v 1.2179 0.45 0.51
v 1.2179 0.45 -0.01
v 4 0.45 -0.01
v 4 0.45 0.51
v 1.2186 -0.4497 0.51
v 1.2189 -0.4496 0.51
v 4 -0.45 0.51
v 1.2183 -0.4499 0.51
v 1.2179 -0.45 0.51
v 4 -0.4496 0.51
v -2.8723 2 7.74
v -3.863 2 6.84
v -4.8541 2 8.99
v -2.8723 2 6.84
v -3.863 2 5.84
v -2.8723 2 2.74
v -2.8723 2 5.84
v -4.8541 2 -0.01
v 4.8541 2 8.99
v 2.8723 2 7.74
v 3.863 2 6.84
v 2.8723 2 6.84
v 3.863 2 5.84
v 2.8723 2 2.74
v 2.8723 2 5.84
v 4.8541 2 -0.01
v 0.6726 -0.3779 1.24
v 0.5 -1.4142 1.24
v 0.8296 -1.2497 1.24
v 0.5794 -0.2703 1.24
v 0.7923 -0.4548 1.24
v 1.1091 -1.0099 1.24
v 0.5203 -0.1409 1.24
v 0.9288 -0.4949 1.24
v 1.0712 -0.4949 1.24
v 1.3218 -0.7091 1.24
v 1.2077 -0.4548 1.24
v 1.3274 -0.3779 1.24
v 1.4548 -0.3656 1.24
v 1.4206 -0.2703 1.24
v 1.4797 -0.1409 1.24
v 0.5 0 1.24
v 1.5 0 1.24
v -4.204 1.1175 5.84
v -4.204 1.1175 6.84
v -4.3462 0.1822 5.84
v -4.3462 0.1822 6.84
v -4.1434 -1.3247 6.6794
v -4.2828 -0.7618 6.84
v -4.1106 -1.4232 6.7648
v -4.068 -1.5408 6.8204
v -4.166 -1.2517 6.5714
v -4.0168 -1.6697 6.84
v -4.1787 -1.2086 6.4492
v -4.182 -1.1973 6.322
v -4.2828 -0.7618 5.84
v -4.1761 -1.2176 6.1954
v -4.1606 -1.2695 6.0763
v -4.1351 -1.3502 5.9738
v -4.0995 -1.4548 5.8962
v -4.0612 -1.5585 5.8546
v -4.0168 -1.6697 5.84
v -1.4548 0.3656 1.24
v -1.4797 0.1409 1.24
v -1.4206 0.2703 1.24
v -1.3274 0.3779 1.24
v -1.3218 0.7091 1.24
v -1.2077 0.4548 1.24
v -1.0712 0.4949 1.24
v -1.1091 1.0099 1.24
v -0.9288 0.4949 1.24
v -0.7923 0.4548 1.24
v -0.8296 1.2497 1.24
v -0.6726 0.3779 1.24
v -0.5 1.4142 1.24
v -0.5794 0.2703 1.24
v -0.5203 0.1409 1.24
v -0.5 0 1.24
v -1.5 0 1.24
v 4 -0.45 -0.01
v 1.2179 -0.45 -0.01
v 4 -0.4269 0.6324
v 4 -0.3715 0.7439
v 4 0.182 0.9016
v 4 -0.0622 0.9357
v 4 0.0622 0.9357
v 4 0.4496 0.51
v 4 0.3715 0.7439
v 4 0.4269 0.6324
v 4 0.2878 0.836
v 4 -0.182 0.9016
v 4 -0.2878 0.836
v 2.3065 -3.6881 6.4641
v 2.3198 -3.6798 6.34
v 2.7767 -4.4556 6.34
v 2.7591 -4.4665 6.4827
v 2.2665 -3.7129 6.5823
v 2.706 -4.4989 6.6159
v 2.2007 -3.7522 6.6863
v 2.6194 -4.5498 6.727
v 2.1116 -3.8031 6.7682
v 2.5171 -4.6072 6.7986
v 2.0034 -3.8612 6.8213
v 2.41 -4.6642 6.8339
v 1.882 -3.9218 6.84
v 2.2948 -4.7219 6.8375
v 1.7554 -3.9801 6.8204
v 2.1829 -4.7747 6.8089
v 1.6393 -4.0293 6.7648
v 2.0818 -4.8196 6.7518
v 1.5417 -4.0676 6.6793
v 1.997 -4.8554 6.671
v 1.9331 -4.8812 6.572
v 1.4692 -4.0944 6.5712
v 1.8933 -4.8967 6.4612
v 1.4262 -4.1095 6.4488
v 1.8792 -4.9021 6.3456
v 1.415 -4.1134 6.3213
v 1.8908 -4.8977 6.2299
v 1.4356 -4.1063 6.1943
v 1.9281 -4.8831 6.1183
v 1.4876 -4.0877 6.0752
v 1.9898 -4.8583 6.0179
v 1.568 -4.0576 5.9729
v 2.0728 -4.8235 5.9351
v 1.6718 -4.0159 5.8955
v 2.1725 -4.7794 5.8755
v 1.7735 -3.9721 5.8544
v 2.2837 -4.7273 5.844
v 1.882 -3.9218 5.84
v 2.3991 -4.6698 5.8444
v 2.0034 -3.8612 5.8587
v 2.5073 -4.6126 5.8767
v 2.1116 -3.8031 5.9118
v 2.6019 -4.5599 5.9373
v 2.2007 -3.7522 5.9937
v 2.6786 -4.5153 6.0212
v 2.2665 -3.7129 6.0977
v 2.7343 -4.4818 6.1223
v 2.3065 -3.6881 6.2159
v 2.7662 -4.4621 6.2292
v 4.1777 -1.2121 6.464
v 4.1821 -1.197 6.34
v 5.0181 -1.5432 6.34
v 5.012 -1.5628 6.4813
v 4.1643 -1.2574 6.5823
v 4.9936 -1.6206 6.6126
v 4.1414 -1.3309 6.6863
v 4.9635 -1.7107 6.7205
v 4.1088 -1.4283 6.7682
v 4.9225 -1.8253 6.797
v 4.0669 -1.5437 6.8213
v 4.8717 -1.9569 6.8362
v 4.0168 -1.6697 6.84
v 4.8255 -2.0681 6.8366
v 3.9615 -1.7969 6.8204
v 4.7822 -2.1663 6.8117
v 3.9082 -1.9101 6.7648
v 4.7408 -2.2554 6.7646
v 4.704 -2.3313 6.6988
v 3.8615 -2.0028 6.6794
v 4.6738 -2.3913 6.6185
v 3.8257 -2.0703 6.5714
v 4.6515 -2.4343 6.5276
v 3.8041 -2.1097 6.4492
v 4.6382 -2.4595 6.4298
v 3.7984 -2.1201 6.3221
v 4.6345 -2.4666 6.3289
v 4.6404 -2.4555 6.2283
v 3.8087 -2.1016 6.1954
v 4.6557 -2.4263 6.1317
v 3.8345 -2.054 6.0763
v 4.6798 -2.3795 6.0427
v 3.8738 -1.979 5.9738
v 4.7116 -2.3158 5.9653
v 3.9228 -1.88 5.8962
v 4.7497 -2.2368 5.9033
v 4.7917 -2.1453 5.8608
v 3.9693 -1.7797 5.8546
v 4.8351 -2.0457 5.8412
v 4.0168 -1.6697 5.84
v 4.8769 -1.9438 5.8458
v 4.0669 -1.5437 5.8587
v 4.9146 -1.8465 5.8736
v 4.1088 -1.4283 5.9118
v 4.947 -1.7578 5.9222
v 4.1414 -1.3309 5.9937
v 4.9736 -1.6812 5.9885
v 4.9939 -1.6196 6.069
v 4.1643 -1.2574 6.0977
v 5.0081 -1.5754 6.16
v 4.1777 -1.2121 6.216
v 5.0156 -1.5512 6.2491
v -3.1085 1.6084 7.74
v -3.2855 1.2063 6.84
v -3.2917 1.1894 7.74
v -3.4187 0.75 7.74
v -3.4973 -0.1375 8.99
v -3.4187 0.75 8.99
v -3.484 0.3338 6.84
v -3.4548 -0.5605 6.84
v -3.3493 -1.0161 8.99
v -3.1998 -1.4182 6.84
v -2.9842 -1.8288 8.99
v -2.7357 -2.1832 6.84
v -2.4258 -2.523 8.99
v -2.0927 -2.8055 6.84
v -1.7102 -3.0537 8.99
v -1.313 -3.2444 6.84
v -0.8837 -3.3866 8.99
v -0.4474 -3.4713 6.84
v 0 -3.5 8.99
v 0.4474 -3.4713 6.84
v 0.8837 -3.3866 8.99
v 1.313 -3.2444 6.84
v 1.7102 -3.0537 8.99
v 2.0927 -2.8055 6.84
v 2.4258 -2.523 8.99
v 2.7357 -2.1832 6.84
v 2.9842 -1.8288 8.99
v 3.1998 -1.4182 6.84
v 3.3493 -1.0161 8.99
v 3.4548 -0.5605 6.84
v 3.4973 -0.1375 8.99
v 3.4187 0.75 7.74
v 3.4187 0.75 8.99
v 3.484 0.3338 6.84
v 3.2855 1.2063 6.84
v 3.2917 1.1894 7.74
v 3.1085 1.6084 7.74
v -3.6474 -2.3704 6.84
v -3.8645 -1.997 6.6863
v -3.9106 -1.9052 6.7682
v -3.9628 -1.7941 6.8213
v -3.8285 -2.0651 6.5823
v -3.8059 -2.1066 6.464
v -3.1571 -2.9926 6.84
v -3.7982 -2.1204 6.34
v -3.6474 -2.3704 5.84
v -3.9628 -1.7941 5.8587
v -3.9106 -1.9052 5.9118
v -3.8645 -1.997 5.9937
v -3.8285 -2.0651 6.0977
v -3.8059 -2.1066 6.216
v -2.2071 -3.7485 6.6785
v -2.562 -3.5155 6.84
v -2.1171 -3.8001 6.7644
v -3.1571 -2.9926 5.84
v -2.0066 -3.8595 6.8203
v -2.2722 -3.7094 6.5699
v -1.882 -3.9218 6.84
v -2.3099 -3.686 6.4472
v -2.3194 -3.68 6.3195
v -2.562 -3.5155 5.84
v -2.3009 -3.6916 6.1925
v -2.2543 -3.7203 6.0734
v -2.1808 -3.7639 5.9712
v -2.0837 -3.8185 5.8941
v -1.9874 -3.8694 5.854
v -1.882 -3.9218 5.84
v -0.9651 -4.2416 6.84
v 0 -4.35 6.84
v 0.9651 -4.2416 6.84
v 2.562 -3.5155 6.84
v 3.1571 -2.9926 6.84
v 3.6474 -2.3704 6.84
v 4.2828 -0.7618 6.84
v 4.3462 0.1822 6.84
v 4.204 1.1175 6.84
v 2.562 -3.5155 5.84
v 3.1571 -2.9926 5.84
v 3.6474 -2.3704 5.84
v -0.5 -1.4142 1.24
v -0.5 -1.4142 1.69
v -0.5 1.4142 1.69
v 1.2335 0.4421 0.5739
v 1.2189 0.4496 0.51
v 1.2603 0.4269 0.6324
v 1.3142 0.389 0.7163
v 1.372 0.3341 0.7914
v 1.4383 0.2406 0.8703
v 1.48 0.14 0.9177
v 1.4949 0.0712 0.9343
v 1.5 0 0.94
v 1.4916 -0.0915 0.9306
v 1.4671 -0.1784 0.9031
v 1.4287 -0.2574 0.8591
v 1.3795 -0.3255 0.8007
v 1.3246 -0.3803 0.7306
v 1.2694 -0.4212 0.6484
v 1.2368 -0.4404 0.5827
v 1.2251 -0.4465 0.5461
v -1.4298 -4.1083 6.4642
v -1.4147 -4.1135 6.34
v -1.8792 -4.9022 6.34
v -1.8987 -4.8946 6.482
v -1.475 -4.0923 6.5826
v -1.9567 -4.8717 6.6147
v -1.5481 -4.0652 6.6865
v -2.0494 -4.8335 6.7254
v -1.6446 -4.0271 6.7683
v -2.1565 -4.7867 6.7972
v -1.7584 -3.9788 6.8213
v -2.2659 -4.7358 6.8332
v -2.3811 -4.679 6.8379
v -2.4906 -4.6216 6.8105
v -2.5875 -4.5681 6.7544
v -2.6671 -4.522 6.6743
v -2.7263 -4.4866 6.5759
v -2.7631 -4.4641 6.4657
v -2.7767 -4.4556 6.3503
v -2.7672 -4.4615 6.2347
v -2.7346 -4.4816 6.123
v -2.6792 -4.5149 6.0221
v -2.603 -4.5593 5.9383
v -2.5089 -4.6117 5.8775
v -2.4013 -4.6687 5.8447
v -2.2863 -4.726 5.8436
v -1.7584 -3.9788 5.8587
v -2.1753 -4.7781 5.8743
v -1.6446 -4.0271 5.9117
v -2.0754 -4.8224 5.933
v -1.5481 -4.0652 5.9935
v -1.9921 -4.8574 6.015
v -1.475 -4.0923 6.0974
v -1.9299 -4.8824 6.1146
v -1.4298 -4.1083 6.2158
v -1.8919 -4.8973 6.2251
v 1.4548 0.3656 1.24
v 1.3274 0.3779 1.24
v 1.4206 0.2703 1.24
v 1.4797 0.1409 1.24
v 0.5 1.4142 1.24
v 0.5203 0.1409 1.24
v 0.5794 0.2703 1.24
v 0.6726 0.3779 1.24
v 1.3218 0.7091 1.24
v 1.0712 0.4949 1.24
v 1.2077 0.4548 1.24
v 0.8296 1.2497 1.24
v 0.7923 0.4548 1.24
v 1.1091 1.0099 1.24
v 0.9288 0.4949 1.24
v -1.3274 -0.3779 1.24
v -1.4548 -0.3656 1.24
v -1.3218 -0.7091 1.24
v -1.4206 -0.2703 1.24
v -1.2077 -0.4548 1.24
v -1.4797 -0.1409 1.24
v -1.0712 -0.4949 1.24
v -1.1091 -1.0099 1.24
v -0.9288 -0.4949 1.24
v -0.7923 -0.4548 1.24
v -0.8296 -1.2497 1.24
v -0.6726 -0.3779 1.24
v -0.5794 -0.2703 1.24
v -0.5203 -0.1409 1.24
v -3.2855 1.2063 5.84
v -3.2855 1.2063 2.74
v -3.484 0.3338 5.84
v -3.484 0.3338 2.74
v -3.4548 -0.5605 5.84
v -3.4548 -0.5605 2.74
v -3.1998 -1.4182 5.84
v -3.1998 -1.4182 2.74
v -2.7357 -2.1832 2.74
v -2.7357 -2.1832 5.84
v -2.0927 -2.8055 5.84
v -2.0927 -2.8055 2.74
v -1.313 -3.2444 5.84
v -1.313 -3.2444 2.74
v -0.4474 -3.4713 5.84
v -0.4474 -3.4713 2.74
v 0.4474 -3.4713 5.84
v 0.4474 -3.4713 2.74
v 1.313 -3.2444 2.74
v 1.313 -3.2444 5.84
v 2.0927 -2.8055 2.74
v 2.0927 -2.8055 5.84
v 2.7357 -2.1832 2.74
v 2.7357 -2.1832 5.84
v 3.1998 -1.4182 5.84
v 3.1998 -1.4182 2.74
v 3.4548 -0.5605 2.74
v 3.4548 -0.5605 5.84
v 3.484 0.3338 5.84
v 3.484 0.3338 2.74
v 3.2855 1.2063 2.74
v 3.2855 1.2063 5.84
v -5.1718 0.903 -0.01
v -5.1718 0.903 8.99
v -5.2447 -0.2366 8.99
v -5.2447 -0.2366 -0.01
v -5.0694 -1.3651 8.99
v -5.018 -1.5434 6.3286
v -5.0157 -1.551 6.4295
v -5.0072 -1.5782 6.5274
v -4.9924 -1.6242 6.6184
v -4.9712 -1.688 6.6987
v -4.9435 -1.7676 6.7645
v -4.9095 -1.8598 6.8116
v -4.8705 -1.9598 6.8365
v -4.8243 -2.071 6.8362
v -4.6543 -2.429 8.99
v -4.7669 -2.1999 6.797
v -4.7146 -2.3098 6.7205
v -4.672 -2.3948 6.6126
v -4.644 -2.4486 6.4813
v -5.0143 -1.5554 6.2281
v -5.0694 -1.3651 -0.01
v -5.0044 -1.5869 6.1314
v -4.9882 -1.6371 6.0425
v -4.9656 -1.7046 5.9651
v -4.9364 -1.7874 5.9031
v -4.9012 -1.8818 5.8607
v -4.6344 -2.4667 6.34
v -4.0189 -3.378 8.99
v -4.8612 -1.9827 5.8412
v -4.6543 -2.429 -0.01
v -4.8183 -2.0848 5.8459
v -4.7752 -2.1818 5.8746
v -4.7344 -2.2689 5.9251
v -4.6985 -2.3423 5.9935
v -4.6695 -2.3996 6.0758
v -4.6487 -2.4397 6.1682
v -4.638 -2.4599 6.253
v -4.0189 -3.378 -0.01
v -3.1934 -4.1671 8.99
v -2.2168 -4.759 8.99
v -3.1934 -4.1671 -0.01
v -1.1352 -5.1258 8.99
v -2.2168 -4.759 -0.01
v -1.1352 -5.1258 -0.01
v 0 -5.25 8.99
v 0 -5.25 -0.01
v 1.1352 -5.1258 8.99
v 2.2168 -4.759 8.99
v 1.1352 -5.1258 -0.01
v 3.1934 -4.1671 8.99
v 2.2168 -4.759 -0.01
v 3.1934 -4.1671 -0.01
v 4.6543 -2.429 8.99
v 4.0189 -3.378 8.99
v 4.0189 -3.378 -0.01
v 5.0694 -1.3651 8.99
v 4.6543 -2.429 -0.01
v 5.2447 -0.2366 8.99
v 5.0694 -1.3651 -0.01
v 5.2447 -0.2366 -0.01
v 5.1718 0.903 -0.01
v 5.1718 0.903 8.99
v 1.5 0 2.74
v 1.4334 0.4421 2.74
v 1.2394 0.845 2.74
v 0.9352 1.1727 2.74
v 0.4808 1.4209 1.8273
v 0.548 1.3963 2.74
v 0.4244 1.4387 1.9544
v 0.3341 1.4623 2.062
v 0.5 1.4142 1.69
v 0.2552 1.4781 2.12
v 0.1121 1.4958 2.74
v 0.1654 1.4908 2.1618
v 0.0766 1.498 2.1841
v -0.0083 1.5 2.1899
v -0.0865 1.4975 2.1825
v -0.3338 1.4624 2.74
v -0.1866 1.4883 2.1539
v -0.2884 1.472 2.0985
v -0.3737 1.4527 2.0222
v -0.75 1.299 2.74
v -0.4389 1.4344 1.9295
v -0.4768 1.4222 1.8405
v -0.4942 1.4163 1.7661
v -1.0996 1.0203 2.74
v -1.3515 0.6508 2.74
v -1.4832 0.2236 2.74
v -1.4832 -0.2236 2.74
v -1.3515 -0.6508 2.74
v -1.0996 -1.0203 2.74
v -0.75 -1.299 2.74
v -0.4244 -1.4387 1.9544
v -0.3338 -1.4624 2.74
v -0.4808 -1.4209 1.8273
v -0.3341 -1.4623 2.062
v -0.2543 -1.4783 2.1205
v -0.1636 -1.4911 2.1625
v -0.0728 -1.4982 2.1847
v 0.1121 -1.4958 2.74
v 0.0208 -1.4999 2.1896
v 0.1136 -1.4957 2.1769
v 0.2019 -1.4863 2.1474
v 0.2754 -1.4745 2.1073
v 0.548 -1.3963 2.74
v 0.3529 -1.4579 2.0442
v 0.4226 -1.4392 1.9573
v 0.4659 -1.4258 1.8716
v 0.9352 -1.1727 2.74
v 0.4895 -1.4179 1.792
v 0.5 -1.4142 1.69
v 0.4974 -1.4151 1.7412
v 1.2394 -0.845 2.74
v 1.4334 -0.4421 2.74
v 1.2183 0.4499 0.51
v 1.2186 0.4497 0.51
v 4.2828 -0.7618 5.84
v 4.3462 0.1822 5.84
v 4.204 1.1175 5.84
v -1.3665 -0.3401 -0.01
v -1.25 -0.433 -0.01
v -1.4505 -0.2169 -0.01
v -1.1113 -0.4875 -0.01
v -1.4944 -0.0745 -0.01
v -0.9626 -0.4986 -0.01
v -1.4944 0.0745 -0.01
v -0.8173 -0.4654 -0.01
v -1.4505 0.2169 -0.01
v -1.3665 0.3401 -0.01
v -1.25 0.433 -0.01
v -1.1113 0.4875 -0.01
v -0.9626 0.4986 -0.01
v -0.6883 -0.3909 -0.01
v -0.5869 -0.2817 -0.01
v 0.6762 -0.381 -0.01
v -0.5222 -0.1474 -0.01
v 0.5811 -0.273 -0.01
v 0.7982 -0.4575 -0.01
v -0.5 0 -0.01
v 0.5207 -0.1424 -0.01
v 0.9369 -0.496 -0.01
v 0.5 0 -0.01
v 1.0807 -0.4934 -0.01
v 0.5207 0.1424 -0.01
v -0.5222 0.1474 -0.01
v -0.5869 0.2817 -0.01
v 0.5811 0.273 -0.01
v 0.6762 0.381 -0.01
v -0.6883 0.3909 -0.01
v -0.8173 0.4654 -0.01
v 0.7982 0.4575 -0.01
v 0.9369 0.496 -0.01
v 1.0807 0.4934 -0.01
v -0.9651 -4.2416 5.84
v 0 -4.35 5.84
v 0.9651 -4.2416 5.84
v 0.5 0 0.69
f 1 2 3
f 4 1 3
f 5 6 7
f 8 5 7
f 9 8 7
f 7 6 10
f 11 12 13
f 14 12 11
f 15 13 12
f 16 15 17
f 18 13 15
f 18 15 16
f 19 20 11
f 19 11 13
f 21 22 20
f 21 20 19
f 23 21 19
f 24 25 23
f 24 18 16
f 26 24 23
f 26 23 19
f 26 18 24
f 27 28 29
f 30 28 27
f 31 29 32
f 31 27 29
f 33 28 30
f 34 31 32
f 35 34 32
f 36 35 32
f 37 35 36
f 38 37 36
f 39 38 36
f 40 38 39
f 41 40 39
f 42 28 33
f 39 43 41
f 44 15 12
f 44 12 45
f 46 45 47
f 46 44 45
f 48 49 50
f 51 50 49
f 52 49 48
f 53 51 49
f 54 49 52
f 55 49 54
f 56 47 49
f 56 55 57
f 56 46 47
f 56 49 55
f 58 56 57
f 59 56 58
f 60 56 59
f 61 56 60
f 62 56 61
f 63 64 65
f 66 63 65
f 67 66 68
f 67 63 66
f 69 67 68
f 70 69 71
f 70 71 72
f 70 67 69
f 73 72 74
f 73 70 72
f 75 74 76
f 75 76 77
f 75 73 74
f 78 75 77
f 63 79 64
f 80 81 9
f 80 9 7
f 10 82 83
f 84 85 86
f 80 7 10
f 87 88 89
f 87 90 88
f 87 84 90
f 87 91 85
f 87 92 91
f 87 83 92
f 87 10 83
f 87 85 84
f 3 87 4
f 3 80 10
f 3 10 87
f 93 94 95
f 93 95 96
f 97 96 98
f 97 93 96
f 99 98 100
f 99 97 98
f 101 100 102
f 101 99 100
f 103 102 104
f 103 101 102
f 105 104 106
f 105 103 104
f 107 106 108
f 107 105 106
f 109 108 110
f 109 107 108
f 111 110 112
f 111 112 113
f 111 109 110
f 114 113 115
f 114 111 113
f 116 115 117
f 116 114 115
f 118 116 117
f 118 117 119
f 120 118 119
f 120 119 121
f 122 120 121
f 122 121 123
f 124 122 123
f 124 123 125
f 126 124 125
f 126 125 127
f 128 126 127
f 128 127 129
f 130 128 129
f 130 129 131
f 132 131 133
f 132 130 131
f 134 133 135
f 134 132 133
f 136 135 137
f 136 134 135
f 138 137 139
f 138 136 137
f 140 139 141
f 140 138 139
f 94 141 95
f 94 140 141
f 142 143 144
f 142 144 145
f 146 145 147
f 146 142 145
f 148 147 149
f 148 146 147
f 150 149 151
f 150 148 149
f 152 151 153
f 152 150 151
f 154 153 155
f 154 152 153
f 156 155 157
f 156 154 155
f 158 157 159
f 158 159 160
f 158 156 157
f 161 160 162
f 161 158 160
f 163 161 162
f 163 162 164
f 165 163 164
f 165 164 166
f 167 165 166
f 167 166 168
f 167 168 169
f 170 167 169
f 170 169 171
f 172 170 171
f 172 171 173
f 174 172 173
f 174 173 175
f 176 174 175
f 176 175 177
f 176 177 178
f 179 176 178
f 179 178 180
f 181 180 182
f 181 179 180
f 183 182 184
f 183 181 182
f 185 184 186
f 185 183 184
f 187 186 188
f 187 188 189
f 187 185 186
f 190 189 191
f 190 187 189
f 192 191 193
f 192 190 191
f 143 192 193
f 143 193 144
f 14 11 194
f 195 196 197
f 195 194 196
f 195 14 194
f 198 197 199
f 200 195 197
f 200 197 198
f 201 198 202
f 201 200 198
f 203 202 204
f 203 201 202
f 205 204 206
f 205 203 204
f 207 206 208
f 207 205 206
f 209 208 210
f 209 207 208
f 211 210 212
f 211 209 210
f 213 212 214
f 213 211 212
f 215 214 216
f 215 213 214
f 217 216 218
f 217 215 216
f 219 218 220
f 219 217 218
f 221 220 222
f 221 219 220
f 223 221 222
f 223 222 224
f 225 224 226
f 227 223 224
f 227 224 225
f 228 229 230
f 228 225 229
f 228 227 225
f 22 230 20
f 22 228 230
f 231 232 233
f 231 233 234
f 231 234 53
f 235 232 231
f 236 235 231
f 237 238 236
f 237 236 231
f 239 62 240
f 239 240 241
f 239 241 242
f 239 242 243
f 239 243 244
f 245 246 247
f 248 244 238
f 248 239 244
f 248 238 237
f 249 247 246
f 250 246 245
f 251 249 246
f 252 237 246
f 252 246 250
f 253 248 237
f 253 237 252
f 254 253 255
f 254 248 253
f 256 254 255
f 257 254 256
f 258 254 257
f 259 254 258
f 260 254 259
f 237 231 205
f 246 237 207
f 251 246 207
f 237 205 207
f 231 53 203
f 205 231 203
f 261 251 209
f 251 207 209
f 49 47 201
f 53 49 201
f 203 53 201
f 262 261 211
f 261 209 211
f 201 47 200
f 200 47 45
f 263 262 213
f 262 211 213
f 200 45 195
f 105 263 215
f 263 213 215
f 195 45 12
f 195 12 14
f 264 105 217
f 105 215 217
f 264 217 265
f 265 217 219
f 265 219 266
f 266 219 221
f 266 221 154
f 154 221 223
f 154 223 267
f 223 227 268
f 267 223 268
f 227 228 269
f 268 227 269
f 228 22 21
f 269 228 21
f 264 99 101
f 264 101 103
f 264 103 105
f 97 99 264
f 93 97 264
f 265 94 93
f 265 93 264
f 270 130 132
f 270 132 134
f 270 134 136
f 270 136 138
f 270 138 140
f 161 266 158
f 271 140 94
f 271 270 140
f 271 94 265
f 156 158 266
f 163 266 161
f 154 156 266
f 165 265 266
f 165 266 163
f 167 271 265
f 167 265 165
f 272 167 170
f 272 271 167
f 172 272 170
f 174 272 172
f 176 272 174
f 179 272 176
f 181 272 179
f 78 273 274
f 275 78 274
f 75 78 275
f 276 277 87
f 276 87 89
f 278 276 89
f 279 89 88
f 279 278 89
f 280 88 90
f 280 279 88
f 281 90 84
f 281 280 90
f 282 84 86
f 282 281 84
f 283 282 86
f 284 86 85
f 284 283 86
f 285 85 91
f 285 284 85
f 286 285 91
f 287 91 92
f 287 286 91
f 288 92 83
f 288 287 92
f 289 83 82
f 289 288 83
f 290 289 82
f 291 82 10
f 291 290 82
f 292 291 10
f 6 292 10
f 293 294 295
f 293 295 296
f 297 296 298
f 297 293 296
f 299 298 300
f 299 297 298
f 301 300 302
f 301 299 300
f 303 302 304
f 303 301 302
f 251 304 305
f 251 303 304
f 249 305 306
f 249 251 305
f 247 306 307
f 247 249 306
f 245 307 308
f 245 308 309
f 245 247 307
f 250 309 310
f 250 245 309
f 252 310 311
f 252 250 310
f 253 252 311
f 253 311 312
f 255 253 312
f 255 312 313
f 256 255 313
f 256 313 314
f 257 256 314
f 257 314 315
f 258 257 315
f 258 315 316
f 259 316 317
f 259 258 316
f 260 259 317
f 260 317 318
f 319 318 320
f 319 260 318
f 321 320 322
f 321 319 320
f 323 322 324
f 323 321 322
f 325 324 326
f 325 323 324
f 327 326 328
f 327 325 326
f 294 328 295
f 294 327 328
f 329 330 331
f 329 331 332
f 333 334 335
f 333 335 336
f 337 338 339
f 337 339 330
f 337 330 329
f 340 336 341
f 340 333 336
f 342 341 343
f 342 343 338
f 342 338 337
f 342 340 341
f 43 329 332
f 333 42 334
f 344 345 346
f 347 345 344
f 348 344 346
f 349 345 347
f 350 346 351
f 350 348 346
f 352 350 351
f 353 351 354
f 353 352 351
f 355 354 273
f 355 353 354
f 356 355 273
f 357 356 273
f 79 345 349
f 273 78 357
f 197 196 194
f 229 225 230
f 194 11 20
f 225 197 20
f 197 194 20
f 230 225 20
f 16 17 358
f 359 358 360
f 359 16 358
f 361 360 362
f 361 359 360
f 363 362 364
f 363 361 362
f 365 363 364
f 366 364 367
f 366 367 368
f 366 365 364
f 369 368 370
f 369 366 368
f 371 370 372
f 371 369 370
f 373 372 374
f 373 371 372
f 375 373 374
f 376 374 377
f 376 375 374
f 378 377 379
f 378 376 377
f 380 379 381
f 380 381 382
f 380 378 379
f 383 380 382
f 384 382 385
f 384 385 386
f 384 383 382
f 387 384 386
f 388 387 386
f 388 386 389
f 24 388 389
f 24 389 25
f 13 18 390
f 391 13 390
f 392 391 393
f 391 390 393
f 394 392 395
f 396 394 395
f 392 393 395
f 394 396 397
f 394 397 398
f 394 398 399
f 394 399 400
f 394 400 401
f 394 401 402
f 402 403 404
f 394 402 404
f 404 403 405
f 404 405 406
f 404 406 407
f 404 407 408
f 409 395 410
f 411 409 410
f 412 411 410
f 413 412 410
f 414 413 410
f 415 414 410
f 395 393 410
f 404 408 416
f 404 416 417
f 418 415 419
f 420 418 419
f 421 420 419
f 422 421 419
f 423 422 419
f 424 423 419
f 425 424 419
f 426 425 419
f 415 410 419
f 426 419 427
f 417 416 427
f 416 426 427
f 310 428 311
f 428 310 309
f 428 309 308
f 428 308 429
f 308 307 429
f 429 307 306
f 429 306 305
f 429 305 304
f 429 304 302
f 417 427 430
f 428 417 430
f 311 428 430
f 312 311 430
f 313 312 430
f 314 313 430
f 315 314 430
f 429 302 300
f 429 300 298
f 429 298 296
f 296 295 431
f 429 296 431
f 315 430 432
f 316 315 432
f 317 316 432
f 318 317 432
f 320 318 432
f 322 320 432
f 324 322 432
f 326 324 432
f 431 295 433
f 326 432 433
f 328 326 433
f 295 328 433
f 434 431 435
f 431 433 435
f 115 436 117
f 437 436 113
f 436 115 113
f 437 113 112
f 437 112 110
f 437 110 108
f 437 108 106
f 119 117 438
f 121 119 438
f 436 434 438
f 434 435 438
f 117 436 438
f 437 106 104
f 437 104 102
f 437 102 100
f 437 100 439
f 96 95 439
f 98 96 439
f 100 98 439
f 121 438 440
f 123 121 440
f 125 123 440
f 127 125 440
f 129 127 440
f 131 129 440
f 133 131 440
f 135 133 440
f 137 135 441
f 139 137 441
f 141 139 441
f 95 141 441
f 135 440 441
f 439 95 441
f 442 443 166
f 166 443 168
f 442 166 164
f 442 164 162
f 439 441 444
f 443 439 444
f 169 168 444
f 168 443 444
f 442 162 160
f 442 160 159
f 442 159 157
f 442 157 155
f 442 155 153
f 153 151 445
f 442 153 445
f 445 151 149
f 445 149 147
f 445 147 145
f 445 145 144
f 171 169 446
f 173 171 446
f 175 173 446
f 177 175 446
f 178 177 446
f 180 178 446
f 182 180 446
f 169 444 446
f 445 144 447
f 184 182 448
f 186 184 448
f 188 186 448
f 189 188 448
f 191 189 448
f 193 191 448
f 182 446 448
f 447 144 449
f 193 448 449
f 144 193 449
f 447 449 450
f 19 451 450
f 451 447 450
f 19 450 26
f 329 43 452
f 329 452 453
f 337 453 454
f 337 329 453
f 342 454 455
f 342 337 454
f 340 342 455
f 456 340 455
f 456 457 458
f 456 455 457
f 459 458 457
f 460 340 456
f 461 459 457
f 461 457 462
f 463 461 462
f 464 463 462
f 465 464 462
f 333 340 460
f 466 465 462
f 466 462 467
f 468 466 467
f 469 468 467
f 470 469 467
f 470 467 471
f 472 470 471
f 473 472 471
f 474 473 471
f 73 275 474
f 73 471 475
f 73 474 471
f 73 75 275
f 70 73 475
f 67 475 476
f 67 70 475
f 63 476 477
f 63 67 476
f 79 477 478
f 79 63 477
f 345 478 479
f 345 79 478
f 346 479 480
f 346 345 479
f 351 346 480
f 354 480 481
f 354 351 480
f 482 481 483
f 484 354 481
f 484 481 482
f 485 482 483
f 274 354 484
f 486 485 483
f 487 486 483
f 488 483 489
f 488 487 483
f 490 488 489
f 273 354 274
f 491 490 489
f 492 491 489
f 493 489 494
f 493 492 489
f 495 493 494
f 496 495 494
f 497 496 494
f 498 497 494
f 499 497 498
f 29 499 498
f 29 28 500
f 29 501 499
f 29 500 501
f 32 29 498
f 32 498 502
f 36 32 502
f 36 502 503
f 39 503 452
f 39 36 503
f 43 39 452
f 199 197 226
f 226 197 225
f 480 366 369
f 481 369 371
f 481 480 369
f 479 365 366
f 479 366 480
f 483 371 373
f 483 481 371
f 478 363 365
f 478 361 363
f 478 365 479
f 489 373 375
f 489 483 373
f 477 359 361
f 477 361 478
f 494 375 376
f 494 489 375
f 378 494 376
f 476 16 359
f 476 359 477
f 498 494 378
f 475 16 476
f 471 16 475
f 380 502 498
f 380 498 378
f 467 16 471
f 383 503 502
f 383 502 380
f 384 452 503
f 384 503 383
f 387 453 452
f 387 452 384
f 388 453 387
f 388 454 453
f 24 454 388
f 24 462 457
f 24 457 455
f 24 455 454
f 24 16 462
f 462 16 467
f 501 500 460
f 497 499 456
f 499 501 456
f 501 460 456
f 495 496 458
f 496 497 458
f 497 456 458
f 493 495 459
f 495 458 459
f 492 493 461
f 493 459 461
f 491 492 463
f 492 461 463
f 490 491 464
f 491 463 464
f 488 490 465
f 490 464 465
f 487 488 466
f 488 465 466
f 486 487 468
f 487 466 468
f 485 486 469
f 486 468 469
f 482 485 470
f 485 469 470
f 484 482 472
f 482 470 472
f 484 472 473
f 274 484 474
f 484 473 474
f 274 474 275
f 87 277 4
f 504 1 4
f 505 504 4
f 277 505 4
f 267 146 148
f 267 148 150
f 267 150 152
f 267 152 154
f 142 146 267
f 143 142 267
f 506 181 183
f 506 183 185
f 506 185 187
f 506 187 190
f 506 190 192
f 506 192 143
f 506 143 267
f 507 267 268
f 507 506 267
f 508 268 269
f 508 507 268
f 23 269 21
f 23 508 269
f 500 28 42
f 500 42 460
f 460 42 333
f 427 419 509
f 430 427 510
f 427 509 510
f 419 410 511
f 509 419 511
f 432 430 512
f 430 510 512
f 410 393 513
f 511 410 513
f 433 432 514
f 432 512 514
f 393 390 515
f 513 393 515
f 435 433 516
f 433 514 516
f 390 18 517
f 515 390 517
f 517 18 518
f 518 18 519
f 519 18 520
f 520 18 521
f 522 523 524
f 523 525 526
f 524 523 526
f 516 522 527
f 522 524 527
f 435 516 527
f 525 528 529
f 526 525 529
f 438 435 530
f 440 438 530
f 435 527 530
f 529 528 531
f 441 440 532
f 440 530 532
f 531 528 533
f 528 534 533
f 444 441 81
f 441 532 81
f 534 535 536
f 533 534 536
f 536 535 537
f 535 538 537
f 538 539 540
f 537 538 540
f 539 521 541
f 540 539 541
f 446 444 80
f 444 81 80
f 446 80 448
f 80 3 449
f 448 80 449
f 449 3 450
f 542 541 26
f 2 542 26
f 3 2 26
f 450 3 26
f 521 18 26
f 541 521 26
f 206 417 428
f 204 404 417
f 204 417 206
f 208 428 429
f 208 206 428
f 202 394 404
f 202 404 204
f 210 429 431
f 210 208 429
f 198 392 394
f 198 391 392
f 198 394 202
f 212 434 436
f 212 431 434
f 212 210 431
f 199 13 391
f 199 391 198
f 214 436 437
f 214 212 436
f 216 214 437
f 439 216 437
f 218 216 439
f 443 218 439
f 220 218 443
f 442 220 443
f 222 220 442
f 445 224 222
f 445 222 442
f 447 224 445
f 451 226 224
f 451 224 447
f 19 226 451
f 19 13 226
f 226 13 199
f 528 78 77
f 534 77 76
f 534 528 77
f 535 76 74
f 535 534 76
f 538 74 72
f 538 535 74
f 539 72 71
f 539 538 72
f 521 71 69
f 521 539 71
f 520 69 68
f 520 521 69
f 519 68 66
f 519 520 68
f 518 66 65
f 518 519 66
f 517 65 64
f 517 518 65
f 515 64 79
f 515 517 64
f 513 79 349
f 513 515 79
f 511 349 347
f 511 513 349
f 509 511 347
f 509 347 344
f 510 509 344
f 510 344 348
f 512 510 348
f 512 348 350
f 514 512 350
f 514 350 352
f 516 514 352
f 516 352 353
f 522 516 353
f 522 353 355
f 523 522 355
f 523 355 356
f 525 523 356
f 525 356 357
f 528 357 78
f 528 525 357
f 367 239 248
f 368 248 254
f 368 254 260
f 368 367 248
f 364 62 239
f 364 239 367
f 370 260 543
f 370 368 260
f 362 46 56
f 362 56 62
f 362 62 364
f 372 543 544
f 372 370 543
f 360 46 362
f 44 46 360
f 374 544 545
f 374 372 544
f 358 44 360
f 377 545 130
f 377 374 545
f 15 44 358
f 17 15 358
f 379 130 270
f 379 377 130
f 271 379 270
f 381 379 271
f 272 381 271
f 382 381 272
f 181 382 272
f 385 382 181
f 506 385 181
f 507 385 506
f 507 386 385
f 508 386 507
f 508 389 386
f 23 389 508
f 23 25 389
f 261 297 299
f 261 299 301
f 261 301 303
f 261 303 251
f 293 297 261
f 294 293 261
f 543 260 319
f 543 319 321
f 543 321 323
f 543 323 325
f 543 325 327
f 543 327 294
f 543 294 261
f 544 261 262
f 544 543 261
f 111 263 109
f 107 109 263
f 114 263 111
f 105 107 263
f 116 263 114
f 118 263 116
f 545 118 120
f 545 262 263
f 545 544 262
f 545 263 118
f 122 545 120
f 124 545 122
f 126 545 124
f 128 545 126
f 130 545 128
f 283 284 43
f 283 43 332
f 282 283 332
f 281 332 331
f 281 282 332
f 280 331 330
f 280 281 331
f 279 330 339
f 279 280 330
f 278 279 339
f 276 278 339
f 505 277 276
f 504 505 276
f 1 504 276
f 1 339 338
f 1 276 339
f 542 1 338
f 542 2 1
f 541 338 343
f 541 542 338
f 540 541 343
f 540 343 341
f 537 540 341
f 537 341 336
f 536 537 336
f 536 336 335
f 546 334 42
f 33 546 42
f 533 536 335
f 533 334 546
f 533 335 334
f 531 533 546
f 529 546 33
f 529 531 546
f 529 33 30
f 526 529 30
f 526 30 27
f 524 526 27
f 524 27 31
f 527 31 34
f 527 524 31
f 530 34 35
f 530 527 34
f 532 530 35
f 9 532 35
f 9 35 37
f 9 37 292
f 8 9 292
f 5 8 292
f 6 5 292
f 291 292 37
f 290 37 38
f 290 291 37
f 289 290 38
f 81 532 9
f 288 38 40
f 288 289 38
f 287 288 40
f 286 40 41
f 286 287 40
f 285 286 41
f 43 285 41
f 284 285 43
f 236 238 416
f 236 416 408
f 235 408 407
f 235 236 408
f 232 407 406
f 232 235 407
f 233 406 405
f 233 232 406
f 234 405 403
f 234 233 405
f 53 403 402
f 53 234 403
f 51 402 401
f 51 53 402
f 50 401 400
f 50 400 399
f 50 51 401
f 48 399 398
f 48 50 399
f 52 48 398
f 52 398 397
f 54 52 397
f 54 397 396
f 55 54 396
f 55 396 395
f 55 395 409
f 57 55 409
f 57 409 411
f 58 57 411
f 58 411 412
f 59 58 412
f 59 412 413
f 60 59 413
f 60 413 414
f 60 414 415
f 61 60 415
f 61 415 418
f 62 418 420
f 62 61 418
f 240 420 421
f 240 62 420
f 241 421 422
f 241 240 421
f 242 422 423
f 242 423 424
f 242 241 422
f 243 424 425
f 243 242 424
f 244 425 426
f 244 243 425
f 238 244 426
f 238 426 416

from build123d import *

# Parameters (mm, degrees)
CYLINDER006_R     = 5.25
CYLINDER006_DEPTH = 9
BOX_W             = 10
BOX_H             = 4
BOX_DEPTH         = 10
CYLINDER007_R     = 3.5
CYLINDER007_DEPTH = 6.5
BOX001_W          = 7.8
BOX001_H          = 1.25
BOX001_DEPTH      = 1.25
CYLINDER008_R     = 0.5
CYLINDER008_DEPTH = 4
CYLINDER009_R     = 0.5
CYLINDER009_DEPTH = 4
CYLINDER012_R     = 0.5
CYLINDER012_DEPTH = 3.5
CYLINDER013_R     = 0.5
CYLINDER013_DEPTH = 4
CYLINDER014_R     = 0.5
CYLINDER014_DEPTH = 4
CYLINDER015_R     = 0.5
CYLINDER015_DEPTH = 3.5
CYLINDER020_R     = 1.5
CYLINDER020_DEPTH = 3
CYLINDER021_R     = 0.45
CYLINDER021_DEPTH = 3
BOX002_W          = 3.2
BOX002_H          = 0.9
BOX002_DEPTH      = 1
CYLINDER022_R     = 0.5
CYLINDER022_DEPTH = 3
BOX003_W          = 1
BOX003_H          = 3
BOX003_DEPTH      = 1
CYLINDER023_R     = 4.35
CYLINDER023_DEPTH = 1


with BuildPart() as part:
    # Cylinder006 → Cylinder006 (join)
    with BuildSketch(Plane.XY.offset(-1.25)):
        Circle(CYLINDER006_R)
    extrude(amount=CYLINDER006_DEPTH)

    # Box → Box (cut)
    with BuildSketch(Plane(origin=(-5, 2, -1.5), x_dir=(1, 0, 0), z_dir=(0, 0, 1))):
        with Locations((5, 2)):
            Rectangle(BOX_W, BOX_H)
    extrude(amount=BOX_DEPTH, mode=Mode.SUBTRACT)

    # Cylinder007 → Cylinder007 (cut)
    with BuildSketch(Plane.XY.offset(1.5)):
        Circle(CYLINDER007_R)
    extrude(amount=CYLINDER007_DEPTH, mode=Mode.SUBTRACT)

    # Box001 → Box001 (join)
    with BuildSketch(Plane(origin=(-3.9, 0.75, 6.5), x_dir=(1, 0, 0), z_dir=(0, 0, 1))):
        with Locations((3.9, 0.625)):
            Rectangle(BOX001_W, BOX001_H)
    extrude(amount=BOX001_DEPTH)

    # Cylinder008 → Cylinder008 (cut)
    with BuildSketch(Plane(origin=(-1, 0, -2), x_dir=(1, 0, 0), z_dir=(0, 0, 1))):
        Circle(CYLINDER008_R)
    extrude(amount=CYLINDER008_DEPTH, mode=Mode.SUBTRACT)

    # Cylinder009 → Cylinder009 (cut)
    with BuildSketch(Plane(origin=(1, 0, -2), x_dir=(1, 0, 0), z_dir=(0, 0, 1))):
        Circle(CYLINDER009_R)
    extrude(amount=CYLINDER009_DEPTH, mode=Mode.SUBTRACT)

    # Cylinder012 → Cylinder012 (cut)
    with BuildSketch(Plane(origin=(-2.4, -1, 5.1), x_dir=(0.382683, -0.92388, 0), z_dir=(-0.92388, -0.382683, 0))):
        Circle(CYLINDER012_R)
    extrude(amount=CYLINDER012_DEPTH, mode=Mode.SUBTRACT)

    # Cylinder013 → Cylinder013 (cut)
    with BuildSketch(Plane(origin=(-0.75, -2, 5.1), x_dir=(0.861629, -0.507538, 0), z_dir=(-0.507538, -0.861629, 0))):
        Circle(CYLINDER013_R)
    extrude(amount=CYLINDER013_DEPTH, mode=Mode.SUBTRACT)

    # Cylinder014 → Cylinder014 (cut)
    with BuildSketch(Plane(origin=(0.75, -2, 5.1), x_dir=(0.861629, 0.507538, 0), z_dir=(0.507538, -0.861629, 0))):
        Circle(CYLINDER014_R)
    extrude(amount=CYLINDER014_DEPTH, mode=Mode.SUBTRACT)

    # Cylinder015 → Cylinder015 (cut)
    with BuildSketch(Plane(origin=(2.4, -1, 5.1), x_dir=(0.382683, 0.92388, 0), z_dir=(0.92388, -0.382683, 0))):
        Circle(CYLINDER015_R)
    extrude(amount=CYLINDER015_DEPTH, mode=Mode.SUBTRACT)

    # Cylinder020 → Cylinder020 (cut)
    with BuildSketch(Plane.XY):
        Circle(CYLINDER020_R)
    extrude(amount=CYLINDER020_DEPTH, mode=Mode.SUBTRACT)

    # Cylinder021 → Cylinder021 (cut)
    with BuildSketch(Plane(origin=(1, 0, -0.75), x_dir=(0, 0, -1), z_dir=(1, 0, 0))):
        Circle(CYLINDER021_R)
    extrude(amount=CYLINDER021_DEPTH, mode=Mode.SUBTRACT)

    # Box002 → Box002 (cut)
    with BuildSketch(Plane(origin=(0.8, -0.45, -1.73), x_dir=(1, 0, 0), z_dir=(0, 0, 1))):
        with Locations((1.6, 0.45)):
            Rectangle(BOX002_W, BOX002_H)
    extrude(amount=BOX002_DEPTH, mode=Mode.SUBTRACT)

    # Cylinder022 → Cylinder022 (join)
    with BuildSketch(Plane(origin=(0, 1.5, 0.45), x_dir=(1, 0, 0), z_dir=(0, -1, 0))):
        Circle(CYLINDER022_R)
    extrude(amount=CYLINDER022_DEPTH)

    # Box003 → Box003 (join)
    with BuildSketch(Plane(origin=(-0.5, -1.5, -0.55), x_dir=(1, 0, 0), z_dir=(0, 0, 1))):
        with Locations((0.5, 1.5)):
            Rectangle(BOX003_W, BOX003_H)
    extrude(amount=BOX003_DEPTH)

    # Cylinder023 → Cylinder023 (cut)
    with BuildSketch(Plane.XY.offset(4.6)):
        Circle(CYLINDER023_R)
    extrude(amount=CYLINDER023_DEPTH, mode=Mode.SUBTRACT)


with BuildPart() as part_1:
    # Body001 placement: moved
    add(part.part.moved(Location((0, 0, 1.24))))


solid = part_1.part
